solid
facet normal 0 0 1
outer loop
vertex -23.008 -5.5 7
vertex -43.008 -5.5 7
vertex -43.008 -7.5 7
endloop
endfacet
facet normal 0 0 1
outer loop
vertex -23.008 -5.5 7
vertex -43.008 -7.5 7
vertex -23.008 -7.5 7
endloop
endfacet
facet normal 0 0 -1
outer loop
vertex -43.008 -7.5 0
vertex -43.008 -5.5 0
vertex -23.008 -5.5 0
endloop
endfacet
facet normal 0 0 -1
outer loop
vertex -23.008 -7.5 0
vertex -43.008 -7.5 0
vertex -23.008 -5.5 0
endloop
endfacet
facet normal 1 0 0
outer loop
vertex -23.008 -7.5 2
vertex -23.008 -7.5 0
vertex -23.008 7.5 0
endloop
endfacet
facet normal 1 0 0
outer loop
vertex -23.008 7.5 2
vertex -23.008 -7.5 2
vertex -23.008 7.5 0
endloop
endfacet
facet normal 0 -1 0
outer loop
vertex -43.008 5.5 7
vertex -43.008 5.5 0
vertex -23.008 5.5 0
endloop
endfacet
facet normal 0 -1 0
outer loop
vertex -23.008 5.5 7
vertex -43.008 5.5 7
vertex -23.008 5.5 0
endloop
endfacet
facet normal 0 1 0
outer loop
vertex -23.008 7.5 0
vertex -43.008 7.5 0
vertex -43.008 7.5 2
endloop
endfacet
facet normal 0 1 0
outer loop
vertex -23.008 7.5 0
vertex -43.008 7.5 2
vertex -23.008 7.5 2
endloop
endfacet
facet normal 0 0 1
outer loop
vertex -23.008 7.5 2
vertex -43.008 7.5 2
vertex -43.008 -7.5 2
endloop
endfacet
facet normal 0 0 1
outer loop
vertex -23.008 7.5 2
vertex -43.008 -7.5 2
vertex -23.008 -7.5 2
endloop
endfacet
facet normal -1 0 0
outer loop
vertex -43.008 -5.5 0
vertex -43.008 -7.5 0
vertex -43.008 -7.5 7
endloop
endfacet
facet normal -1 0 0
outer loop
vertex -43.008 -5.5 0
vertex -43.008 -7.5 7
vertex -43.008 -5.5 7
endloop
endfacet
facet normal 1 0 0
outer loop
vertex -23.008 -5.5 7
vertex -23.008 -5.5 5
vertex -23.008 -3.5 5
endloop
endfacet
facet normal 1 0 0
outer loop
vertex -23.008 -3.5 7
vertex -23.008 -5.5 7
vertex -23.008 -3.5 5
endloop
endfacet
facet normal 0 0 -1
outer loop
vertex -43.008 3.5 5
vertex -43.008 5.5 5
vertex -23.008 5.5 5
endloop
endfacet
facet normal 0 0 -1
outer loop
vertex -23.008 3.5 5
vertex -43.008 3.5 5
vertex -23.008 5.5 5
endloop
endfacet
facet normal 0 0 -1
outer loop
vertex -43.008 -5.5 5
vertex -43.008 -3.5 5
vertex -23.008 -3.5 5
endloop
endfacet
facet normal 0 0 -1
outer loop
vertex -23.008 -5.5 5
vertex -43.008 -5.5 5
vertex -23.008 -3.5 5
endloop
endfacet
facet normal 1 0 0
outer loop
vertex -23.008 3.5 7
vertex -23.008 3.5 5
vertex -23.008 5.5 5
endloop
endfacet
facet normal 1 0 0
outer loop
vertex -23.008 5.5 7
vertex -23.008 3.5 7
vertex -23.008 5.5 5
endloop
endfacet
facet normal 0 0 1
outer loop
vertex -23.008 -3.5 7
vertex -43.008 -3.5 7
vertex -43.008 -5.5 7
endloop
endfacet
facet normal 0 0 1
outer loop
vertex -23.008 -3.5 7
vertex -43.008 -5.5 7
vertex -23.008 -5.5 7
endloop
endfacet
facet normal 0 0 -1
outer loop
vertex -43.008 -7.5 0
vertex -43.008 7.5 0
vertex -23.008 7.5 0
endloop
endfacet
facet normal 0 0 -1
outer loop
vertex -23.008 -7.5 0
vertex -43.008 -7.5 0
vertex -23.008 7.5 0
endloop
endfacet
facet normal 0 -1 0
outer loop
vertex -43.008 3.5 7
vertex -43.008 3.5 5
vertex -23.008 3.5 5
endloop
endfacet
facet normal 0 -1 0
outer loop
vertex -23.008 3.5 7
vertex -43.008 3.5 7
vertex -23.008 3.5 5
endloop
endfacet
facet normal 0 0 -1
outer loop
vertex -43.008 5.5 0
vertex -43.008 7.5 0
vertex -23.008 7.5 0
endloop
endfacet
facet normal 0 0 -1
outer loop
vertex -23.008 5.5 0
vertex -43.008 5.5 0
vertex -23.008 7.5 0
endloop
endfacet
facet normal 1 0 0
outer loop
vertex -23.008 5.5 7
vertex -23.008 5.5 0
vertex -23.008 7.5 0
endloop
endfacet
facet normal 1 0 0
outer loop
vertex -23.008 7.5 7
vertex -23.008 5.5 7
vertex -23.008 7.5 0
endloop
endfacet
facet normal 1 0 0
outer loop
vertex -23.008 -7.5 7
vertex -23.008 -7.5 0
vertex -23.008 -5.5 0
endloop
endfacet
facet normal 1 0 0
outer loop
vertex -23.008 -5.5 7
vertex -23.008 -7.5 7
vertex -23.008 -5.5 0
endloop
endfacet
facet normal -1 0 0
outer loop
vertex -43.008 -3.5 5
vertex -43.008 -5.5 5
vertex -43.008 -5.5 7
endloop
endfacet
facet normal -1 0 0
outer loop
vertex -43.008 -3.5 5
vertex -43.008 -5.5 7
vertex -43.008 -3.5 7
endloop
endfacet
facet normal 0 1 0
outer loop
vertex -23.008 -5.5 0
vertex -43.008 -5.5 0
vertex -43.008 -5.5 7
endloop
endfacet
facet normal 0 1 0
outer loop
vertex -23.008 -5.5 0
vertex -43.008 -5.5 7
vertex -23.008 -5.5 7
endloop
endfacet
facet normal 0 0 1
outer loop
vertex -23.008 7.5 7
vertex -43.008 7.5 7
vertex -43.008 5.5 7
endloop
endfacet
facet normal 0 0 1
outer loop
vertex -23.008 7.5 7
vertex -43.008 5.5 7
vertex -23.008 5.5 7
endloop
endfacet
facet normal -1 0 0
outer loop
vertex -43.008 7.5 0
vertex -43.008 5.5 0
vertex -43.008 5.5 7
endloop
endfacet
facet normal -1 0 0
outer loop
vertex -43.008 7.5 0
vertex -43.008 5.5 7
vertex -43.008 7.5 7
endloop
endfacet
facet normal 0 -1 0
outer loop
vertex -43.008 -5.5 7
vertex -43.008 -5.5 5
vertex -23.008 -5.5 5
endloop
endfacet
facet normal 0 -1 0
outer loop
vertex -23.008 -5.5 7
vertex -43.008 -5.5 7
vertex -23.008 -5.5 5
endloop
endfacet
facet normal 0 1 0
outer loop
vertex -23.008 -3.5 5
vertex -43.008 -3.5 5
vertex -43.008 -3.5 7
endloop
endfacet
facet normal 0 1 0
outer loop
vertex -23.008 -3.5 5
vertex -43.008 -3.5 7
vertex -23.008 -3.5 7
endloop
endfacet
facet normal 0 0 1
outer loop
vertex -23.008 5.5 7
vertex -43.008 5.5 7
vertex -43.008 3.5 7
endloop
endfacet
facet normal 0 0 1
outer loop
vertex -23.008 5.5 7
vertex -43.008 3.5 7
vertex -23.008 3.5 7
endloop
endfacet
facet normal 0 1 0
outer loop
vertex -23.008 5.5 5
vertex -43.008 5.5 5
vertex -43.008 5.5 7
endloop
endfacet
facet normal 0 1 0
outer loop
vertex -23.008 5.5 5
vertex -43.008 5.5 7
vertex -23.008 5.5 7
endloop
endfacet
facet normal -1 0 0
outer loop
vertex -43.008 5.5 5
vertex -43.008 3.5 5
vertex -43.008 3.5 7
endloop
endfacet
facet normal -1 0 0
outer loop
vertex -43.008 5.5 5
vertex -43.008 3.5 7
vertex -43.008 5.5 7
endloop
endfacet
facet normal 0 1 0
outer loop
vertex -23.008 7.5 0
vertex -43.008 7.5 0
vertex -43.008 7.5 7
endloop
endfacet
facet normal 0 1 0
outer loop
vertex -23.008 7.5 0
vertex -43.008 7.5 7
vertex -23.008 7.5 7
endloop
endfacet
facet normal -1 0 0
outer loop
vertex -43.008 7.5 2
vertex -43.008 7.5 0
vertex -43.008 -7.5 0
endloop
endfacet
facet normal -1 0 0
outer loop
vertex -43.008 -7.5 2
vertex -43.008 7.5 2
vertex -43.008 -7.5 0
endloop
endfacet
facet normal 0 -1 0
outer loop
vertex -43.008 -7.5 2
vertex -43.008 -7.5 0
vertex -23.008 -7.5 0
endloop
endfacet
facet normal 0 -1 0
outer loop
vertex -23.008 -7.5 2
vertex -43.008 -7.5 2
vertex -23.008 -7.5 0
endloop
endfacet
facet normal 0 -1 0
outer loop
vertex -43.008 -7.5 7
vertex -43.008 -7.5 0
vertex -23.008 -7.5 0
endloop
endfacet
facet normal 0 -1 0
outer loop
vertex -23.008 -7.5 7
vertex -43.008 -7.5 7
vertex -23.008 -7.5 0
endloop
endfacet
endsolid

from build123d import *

# Parameters (mm, degrees)
F0_W     = 20
F0_H     = 2
F1_DEPTH = 7
F0_H_2   = 7
F2_DEPTH = 2
F3_START = 5
F3_DEPTH = 2


with BuildPart() as f1:
    # F0 (on Top) → F1 (new body)
    with BuildSketch(Plane.XY):
        with Locations((-33.0076411562, -6.5)):
            Rectangle(F0_W, F0_H)
    extrude(amount=F1_DEPTH)


with BuildPart() as f1b:
    # F0 (on Top) → F1, piece 2 (new body)
    with BuildSketch(Plane.XY):
        with Locations((-33.0076411562, 6.5)):
            Rectangle(F0_W, F0_H)
    extrude(amount=F1_DEPTH)


with BuildPart() as f2:
    # F0 (on Top) → F2 (new body)
    with BuildSketch(Plane.XY):
        with Locations((-33.0076411562, 6.5)):
            Rectangle(F0_W, F0_H)
        with Locations((-33.0076411562, 4.5)):
            Rectangle(F0_W, F0_H)
        with Locations((-33.0076411562, 0)):
            Rectangle(F0_W, F0_H_2)
        with Locations((-33.0076411562, -4.5)):
            Rectangle(F0_W, F0_H)
        with Locations((-33.0076411562, -6.5)):
            Rectangle(F0_W, F0_H)
    extrude(amount=F2_DEPTH)


with BuildPart() as f3:
    # F0 (on Top) → F3 (new body)
    with BuildSketch(Plane.XY.offset(F3_START)):
        with Locations((-33.0076411562, 4.5)):
            Rectangle(F0_W, F0_H)
    extrude(amount=F3_DEPTH)


with BuildPart() as f3b:
    # F0 (on Top) → F3, piece 2 (new body)
    with BuildSketch(Plane.XY.offset(F3_START)):
        with Locations((-33.0076411562, -4.5)):
            Rectangle(F0_W, F0_H)
    extrude(amount=F3_DEPTH)


solid = Compound([f1.part, f1b.part, f2.part, f3.part, f3b.part])
